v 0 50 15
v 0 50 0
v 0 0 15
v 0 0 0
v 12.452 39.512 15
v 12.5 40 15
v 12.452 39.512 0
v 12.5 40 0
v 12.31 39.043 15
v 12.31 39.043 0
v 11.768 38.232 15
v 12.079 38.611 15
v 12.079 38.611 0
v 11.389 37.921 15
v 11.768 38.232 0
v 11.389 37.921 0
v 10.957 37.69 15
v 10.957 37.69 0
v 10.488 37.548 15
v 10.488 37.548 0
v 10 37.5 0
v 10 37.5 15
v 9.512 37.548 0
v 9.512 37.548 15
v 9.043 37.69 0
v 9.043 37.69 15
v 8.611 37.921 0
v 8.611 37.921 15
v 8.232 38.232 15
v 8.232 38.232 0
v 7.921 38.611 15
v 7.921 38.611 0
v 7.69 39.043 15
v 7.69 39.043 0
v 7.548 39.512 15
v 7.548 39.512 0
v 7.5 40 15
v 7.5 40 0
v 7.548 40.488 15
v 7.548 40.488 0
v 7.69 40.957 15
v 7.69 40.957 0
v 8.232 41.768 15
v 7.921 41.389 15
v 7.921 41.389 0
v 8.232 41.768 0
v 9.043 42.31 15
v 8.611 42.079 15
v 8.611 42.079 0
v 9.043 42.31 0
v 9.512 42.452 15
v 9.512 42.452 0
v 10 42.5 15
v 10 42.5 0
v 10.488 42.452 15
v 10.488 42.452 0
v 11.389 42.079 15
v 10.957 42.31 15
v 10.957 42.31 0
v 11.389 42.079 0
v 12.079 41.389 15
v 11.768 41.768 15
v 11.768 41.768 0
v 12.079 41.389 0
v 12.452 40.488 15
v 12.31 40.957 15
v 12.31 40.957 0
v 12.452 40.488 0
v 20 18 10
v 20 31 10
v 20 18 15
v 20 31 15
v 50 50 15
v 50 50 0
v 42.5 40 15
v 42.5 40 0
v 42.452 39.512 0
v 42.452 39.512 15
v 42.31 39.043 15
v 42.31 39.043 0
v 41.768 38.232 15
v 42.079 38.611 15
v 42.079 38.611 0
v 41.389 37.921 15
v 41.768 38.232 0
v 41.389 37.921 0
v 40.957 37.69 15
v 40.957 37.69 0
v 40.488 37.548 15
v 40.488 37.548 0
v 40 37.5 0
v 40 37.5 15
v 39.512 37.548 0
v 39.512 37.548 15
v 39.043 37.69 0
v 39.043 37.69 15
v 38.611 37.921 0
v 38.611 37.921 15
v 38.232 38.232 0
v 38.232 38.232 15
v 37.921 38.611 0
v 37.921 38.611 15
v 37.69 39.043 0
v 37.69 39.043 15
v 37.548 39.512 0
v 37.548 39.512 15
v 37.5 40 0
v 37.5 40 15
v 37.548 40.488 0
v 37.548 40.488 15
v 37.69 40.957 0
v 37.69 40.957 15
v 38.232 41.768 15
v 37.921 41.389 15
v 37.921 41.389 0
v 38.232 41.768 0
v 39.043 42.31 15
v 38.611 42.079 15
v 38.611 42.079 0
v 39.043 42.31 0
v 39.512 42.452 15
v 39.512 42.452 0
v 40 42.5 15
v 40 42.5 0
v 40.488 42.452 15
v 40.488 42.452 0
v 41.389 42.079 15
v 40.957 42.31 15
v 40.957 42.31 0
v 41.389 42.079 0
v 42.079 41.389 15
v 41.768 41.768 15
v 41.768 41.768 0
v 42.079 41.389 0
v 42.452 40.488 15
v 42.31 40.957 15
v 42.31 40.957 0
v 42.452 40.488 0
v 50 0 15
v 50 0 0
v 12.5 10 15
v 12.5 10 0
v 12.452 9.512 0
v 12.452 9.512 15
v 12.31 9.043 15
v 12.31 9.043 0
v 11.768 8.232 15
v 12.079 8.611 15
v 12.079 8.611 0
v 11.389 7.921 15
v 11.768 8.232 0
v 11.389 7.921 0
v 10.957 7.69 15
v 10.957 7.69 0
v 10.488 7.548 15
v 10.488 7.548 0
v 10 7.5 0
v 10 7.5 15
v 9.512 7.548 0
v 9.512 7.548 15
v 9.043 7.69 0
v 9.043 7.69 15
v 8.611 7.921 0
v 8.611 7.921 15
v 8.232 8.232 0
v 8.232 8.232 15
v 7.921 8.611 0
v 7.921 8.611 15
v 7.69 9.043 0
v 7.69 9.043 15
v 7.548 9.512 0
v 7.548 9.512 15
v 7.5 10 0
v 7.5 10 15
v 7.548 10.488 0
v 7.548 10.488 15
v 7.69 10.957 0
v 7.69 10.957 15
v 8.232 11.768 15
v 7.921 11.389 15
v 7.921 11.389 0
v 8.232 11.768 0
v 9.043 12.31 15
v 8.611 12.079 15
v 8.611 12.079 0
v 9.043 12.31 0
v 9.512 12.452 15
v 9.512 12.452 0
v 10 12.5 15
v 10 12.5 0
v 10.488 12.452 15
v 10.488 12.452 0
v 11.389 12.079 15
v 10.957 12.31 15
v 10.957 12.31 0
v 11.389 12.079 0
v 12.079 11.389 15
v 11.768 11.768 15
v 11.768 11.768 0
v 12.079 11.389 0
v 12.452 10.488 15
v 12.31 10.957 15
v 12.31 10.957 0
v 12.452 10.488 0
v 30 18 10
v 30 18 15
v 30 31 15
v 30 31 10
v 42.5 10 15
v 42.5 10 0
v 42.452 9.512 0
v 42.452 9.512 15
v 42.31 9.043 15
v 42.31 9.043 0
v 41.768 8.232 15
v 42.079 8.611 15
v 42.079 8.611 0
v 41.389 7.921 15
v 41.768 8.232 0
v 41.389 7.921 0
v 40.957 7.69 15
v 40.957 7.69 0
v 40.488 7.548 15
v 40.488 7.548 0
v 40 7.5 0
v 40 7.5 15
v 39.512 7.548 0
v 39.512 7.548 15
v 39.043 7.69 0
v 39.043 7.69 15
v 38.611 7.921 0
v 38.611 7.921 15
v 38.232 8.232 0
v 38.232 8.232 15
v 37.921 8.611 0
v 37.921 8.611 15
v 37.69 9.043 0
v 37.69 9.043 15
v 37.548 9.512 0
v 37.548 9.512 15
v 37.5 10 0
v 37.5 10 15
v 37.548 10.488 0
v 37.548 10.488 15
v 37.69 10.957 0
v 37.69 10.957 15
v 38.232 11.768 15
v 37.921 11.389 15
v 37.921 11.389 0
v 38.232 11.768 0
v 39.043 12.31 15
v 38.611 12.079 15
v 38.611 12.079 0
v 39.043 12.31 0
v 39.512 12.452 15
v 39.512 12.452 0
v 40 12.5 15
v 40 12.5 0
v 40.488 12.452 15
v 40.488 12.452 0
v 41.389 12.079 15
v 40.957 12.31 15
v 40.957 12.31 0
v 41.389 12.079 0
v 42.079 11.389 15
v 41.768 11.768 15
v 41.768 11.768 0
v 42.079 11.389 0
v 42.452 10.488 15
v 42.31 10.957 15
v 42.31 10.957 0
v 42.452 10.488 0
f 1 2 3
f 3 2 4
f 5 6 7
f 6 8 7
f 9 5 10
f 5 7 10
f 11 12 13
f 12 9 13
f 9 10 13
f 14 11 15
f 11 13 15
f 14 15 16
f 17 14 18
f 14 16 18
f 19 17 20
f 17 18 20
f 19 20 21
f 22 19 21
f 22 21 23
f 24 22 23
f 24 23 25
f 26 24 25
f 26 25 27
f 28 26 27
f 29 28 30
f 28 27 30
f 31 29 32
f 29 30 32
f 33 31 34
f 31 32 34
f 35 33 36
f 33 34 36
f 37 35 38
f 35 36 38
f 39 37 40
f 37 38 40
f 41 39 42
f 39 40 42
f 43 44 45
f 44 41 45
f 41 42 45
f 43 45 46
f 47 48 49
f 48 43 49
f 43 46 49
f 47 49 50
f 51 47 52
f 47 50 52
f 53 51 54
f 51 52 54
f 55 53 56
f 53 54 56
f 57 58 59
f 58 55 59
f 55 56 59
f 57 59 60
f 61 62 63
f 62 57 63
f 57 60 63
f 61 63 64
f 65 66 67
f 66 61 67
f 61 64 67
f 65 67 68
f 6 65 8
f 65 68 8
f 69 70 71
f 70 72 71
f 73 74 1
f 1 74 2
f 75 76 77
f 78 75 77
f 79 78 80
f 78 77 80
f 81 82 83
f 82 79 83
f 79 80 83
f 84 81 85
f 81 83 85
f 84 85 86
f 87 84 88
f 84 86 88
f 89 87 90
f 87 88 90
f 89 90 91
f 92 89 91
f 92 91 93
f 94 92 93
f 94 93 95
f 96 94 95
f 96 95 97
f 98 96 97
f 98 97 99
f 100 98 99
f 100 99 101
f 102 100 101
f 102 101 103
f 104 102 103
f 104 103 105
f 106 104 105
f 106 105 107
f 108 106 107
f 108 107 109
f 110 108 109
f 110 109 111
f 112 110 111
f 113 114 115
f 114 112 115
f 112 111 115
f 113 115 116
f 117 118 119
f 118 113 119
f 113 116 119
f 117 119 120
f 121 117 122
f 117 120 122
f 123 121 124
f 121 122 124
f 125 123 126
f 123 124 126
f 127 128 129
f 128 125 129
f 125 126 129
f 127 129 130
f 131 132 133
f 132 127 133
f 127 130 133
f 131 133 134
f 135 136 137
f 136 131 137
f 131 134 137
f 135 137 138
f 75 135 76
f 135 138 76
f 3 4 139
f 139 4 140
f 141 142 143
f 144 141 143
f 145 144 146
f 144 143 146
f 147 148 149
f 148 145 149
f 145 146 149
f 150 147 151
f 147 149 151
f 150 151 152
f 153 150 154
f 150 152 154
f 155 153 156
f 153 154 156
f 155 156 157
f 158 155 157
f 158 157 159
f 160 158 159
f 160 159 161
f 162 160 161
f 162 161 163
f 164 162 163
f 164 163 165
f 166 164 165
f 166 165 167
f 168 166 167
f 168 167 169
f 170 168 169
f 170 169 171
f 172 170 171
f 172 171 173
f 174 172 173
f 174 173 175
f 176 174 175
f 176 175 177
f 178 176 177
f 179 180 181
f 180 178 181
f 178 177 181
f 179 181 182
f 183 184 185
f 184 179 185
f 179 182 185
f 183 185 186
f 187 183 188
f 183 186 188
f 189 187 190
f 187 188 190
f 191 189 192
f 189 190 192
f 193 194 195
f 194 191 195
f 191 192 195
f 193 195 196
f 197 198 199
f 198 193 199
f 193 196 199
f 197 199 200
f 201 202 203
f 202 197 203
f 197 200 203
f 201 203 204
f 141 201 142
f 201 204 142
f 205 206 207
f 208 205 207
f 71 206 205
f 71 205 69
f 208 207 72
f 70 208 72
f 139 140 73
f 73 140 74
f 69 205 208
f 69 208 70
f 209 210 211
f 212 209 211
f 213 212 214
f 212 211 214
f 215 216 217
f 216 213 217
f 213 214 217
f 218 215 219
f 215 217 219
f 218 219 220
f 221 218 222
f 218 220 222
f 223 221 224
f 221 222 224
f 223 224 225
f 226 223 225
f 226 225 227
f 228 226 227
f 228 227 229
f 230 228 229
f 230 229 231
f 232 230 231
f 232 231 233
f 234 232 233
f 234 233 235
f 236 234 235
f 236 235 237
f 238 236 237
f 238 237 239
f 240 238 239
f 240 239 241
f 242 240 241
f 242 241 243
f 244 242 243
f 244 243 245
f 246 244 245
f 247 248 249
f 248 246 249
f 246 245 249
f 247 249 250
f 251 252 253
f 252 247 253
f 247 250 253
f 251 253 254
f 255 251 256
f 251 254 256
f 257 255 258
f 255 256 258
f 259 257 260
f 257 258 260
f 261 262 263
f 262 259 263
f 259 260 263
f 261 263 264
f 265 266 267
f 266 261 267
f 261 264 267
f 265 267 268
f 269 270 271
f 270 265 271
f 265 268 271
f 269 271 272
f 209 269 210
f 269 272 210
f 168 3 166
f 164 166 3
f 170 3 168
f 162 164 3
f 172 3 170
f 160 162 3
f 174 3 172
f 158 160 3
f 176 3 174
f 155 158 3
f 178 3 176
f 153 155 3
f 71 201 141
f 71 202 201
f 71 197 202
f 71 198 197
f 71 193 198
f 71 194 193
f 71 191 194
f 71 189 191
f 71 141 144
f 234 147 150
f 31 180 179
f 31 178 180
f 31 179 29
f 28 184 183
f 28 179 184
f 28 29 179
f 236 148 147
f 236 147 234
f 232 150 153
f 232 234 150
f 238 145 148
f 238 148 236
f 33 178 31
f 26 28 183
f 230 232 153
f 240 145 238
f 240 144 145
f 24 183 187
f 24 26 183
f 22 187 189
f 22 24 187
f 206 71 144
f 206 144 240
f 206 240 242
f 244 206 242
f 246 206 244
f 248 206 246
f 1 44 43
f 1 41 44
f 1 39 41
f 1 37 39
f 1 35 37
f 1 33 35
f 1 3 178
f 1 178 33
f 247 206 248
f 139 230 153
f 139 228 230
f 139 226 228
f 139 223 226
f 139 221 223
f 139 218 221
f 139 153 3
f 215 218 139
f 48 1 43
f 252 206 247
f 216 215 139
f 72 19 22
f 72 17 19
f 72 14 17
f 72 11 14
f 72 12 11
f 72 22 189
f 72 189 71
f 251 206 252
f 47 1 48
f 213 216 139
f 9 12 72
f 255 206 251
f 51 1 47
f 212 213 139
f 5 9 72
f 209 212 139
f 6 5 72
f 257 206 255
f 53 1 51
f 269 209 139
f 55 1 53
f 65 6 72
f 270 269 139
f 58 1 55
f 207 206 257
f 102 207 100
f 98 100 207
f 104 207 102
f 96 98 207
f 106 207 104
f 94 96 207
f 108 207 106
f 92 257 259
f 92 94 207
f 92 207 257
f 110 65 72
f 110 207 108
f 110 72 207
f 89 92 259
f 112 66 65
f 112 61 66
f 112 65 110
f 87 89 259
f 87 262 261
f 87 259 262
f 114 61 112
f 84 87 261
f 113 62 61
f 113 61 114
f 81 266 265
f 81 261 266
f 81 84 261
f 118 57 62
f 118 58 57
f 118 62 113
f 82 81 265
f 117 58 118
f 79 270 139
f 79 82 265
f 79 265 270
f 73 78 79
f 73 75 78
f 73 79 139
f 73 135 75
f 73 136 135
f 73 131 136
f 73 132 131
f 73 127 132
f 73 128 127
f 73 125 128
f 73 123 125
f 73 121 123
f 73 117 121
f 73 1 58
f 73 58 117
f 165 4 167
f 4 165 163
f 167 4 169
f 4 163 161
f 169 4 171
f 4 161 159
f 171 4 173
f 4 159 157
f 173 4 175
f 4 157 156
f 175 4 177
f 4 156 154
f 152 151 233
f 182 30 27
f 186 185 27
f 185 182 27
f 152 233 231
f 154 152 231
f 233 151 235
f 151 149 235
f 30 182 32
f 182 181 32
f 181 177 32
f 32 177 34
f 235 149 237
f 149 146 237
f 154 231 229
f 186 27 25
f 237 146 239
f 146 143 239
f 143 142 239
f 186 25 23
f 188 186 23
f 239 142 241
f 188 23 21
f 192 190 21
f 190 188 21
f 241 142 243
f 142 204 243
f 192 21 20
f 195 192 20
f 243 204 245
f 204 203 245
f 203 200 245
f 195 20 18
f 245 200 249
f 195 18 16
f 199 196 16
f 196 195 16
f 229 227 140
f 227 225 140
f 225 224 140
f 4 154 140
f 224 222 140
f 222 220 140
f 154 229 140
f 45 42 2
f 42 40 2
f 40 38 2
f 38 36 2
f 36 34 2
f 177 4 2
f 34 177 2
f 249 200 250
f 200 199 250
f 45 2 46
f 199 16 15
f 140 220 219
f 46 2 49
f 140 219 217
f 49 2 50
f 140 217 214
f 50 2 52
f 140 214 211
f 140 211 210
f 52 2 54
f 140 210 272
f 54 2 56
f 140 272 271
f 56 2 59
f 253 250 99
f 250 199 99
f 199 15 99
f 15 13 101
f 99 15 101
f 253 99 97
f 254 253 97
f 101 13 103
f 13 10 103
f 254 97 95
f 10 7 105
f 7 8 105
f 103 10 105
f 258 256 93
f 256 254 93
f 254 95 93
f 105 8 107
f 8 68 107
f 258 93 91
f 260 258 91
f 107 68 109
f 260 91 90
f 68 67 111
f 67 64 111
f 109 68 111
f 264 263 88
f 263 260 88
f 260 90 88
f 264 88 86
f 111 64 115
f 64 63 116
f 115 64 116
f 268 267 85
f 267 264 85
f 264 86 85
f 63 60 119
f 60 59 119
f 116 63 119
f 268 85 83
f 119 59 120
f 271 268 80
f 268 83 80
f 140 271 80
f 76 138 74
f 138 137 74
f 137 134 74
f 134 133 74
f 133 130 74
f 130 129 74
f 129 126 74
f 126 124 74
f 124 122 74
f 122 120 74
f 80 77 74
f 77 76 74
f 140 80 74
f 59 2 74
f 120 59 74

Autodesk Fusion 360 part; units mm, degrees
sketch "Esquisse1" plane through (0, 0, 0) normal (0, 0, 1) x (1, 0, 0)
  line L0 (0, 0) -> (50, 0)
  line L1 (50, 0) -> (50, 50)
  line L2 (50, 50) -> (0, 50)
  line L3 (0, 50) -> (0, 0)
  circle A0 centre (10, 40) radius 2.5
  circle A1 centre (40, 40) radius 2.5
  circle A2 centre (10, 10) radius 2.5
  circle A3 centre (40, 10) radius 2.5
  dimension "d1" = 5
  dimension "d2" = 5
  dimension "d3" = 5
  dimension "d4" = 5
extrude "Extrusion1" add sketch "Esquisse1" along normal blind 15
sketch "Esquisse2" plane through (0, 0, 15) normal (0, 0, 1) x (-1, 0, 0)
  circle A0 centre (-10, -40) radius 2.5
  circle A1 centre (-10, -10) radius 2.5
  circle A2 centre (-40, -10) radius 2.5
  circle A3 centre (-40, -40) radius 2.5
  line L0 (0, -50) -> (0, 0)
  line L1 (0, 0) -> (-50, 0)
  line L2 (-50, 0) -> (-50, -50)
  line L3 (-50, -50) -> (0, -50)
  line L4 (0, -25) -> (-20, -25)
  line L5 (-20, -25) -> (-30, -25)
  line L6 (-30, -25) -> (-30, -30)
  line L7 (-30, -30) -> (-20, -30)
  line L8 (-20, -30) -> (-20, -20)
  line L9 (-20, -20) -> (-30, -20)
  line L10 (-30, -20) -> (-30, -25)
  line L11 (-30, -20) -> (-30, -18)
  line L12 (-30, -18) -> (-20, -18)
  line L13 (-20, -18) -> (-20, -20)
  line L14 (-30, -30) -> (-30, -31)
  line L15 (-30, -31) -> (-20, -31)
  line L16 (-20, -31) -> (-20, -30)
  dimension "d7" = 2
  dimension "d8" = 1
extrude "Extrusion2" cut sketch "Esquisse2" against normal blind 5 contours L5 L6 L7 L8 | L5 L8 L9 L10 | L7 L14 L15 L16 | L9 L11 L12 L13
